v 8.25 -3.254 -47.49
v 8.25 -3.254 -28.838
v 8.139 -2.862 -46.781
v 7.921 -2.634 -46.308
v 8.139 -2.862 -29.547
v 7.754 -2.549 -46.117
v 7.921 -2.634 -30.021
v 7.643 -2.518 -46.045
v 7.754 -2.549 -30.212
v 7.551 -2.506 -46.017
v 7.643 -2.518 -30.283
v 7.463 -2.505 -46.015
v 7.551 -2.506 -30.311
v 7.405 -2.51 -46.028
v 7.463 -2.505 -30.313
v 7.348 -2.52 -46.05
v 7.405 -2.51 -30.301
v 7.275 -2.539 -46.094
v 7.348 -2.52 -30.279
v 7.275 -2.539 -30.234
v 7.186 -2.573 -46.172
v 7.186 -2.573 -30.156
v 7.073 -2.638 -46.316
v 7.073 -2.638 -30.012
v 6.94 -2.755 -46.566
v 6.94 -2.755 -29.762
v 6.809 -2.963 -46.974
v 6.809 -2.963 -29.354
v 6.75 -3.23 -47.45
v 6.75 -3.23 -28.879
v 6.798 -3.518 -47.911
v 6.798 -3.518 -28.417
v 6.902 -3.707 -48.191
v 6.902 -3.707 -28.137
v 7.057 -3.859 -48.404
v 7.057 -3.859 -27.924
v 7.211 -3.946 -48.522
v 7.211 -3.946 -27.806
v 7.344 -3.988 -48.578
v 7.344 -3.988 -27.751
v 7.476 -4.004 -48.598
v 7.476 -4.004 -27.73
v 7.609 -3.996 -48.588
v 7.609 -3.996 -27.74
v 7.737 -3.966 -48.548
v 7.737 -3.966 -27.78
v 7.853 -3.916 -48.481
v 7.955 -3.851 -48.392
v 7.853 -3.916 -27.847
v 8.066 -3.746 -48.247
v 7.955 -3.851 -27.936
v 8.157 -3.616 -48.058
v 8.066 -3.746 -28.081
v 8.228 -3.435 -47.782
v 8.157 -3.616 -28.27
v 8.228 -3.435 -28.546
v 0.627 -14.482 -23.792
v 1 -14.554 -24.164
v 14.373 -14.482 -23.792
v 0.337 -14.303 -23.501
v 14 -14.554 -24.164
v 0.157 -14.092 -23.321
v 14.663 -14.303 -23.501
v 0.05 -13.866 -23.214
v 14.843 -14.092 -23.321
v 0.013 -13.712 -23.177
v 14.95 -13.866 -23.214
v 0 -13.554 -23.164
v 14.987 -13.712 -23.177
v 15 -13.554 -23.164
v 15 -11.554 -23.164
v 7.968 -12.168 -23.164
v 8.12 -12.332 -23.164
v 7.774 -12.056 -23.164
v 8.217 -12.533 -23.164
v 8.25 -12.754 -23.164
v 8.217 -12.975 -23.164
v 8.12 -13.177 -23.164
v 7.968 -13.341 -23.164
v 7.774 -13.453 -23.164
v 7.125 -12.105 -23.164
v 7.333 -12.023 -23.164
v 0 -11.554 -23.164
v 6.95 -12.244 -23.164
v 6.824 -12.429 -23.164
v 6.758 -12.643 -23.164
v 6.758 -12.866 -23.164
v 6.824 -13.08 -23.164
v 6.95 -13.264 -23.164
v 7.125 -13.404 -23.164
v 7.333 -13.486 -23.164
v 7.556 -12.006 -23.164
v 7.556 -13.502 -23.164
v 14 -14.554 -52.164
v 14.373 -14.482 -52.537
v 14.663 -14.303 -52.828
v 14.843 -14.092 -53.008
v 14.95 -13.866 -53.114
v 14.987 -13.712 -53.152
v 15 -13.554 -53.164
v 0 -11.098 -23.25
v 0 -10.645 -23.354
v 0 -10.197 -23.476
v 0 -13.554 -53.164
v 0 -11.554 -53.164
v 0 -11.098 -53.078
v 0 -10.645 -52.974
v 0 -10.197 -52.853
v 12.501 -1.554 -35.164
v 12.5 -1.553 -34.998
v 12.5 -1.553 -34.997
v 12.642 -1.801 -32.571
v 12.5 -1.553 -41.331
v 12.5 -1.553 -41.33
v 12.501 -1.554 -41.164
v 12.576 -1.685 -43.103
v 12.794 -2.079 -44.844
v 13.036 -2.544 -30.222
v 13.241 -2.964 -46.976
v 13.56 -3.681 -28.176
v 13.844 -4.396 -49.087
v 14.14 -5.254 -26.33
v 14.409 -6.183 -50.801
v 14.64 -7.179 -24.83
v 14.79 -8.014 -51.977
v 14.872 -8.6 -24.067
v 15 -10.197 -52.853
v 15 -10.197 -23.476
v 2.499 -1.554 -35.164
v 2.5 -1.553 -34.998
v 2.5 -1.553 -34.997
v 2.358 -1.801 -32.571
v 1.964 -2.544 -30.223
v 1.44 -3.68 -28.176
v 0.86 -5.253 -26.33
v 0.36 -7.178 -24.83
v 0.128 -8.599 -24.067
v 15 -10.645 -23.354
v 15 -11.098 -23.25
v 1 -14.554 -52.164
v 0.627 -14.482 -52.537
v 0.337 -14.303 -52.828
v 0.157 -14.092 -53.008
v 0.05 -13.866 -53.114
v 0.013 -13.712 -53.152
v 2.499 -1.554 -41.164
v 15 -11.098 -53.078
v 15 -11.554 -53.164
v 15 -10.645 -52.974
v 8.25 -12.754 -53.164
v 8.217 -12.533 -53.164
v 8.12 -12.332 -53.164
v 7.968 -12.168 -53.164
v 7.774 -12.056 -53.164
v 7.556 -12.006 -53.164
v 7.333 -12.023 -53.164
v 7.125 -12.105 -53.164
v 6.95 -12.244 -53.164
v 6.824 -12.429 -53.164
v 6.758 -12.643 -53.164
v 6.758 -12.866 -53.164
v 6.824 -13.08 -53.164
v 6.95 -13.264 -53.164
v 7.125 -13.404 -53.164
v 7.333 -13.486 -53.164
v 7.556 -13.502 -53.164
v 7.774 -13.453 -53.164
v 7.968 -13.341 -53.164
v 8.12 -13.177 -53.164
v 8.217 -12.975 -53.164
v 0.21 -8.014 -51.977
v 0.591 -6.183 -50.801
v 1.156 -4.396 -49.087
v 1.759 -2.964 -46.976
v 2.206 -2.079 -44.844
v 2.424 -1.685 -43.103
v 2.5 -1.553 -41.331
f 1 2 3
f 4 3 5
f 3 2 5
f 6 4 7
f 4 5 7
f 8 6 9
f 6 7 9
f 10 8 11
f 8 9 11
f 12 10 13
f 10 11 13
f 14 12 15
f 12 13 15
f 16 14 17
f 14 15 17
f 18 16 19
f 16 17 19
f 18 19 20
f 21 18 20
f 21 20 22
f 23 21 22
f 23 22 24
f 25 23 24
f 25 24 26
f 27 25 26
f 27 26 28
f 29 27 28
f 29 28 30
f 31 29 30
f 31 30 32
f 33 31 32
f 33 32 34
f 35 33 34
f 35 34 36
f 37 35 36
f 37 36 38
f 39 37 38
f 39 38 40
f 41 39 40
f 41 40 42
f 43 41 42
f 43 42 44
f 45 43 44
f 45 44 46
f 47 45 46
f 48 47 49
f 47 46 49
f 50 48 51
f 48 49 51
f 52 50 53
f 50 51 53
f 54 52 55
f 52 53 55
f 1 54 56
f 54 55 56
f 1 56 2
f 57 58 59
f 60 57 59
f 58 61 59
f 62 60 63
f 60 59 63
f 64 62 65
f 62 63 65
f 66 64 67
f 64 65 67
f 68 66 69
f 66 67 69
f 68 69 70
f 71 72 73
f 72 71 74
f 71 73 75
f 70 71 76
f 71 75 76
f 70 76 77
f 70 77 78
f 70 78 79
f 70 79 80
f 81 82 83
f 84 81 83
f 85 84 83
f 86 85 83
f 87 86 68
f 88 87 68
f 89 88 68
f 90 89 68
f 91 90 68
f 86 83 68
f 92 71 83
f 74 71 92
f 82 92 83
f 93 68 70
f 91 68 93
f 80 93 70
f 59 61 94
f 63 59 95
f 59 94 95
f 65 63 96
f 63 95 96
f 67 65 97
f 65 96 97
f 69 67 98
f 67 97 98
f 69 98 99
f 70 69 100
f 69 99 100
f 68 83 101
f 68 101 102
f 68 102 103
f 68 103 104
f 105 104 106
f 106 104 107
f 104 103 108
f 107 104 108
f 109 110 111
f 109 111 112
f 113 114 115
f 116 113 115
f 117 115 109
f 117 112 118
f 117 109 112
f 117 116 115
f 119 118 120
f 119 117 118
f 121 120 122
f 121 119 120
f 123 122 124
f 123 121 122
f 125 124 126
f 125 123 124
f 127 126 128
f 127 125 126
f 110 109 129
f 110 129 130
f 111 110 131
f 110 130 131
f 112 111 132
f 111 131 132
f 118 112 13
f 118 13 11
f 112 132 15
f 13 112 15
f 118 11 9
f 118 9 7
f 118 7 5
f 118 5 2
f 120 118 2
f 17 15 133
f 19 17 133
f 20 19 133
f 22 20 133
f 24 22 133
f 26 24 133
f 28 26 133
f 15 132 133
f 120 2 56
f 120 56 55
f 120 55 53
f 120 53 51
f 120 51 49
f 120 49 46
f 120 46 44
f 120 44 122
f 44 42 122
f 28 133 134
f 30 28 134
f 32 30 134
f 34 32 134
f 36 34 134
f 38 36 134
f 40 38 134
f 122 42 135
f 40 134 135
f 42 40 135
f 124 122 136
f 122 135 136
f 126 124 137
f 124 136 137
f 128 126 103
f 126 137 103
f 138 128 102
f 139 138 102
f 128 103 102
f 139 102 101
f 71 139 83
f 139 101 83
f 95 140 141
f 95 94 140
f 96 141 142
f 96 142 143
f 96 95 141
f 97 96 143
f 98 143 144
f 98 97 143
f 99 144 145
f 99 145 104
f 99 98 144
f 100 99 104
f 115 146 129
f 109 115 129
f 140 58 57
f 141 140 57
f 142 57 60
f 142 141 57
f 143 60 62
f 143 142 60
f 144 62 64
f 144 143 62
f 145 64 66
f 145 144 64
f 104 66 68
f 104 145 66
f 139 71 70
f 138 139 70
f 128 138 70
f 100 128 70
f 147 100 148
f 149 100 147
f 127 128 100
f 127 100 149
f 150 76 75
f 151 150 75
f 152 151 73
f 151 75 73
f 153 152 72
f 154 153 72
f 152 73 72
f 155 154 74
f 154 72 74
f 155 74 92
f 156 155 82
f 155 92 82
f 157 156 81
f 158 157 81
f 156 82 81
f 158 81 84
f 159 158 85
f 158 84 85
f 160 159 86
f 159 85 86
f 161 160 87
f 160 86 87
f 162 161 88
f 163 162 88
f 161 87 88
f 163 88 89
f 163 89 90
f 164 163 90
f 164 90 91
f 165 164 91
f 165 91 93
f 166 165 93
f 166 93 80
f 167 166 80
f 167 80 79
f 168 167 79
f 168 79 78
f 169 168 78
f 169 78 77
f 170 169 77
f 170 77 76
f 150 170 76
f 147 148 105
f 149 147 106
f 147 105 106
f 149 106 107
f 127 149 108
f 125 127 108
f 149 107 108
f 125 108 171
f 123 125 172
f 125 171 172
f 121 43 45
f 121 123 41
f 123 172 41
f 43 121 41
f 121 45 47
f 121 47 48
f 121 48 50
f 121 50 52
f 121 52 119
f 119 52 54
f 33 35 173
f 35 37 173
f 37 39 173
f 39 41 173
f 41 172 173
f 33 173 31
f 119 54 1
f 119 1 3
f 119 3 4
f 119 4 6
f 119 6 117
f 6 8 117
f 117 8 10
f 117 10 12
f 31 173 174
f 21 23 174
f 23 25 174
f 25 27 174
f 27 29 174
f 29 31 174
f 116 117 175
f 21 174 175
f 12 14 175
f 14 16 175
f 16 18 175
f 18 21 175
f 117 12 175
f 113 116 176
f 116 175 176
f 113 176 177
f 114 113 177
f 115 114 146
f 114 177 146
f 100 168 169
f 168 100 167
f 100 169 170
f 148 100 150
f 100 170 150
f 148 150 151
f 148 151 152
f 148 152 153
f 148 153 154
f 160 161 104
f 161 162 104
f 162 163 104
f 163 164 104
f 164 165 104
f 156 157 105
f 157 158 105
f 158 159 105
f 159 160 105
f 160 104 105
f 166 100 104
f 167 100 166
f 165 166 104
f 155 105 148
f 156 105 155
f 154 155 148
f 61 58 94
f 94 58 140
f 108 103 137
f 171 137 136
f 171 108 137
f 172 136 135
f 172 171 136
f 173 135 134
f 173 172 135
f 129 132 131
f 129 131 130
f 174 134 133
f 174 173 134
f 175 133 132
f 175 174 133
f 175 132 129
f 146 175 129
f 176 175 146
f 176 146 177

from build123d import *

# Parameters (mm, degrees)
BOSS_EXTRUDE1_DEPTH = 15
CUT_EXTRUDE1_START  = -52.852812827
CUT_EXTRUDE1_DEPTH  = 29.377193365
SKETCH4_R           = 0.75
CUT_EXTRUDE2_DEPTH  = 37.562677601
FILLET1_R           = 1


# Read off the part's stored shape, not the designer's step: Cut-Extrude1
with BuildPart() as part:
    # Sketch2 → Boss-Extrude1 (new body)
    with BuildSketch(Plane(origin=(0, 0, 0), x_dir=(0, 0, -1), z_dir=(1, 0, 0))):
        with BuildLine():
            Line((23.164216144, -14.554359634), (53.164216144, -14.554359634))
            Line((53.164216144, -14.554359634), (53.164216144, -11.554359634))
            ThreePointArc((53.164216144, -11.554359634), (49.01383429, -4.334817859), (41.164216144, -1.554359634))
            Line((41.164216144, -1.554359634), (35.164216144, -1.554359634))
            ThreePointArc((35.164216144, -1.554359634), (27.314597998, -4.334817859), (23.164216144, -11.554359634))
            Line((23.164216144, -11.554359634), (23.164216144, -14.554359634))
        make_face()
    extrude(amount=BOSS_EXTRUDE1_DEPTH)

    # Cut-Extrude1 outline → Cut-Extrude1 (cut)
    with BuildSketch(Plane.XY.offset(CUT_EXTRUDE1_START)):
        with BuildLine():
            Line((2.5, -1.553202413), (0, -1.553202413))
            Line((0, -1.553202413), (0, -10.196848008))
            ThreePointArc((0, -10.196848008), (0.718019025, -5.721160452), (2.5, -1.553202413))
        make_face()
        with BuildLine():
            Line((15, -1.553202413), (12.5, -1.553202413))
            ThreePointArc((12.5, -1.553202413), (14.281980975, -5.721160452), (15, -10.196848008))
            Line((15, -10.196848008), (15, -1.553202413))
        make_face()
    extrude(amount=CUT_EXTRUDE1_DEPTH, mode=Mode.SUBTRACT)

    # Sketch4 → Cut-Extrude2 (cut, through all)
    with BuildSketch(Plane.XY.offset(-23.164216144)):
        with Locations((7.5, -12.754359634)):
            Circle(SKETCH4_R)
        with Locations((7.5, -3.254359634)):
            Circle(SKETCH4_R)
    extrude(amount=-CUT_EXTRUDE2_DEPTH, mode=Mode.SUBTRACT)

    # Fillet1
    fillet1_edges = [part.edges().sort_by_distance(p)[0] for p in [
        (7.5, -14.554359634, -53.164216144),
        (7.5, -14.554359634, -23.164216144),
        (0, -14.554359634, -38.164216144),
        (15, -14.554359634, -38.164216144),
    ]]
    fillet(fillet1_edges, radius=FILLET1_R)


solid = part.part
